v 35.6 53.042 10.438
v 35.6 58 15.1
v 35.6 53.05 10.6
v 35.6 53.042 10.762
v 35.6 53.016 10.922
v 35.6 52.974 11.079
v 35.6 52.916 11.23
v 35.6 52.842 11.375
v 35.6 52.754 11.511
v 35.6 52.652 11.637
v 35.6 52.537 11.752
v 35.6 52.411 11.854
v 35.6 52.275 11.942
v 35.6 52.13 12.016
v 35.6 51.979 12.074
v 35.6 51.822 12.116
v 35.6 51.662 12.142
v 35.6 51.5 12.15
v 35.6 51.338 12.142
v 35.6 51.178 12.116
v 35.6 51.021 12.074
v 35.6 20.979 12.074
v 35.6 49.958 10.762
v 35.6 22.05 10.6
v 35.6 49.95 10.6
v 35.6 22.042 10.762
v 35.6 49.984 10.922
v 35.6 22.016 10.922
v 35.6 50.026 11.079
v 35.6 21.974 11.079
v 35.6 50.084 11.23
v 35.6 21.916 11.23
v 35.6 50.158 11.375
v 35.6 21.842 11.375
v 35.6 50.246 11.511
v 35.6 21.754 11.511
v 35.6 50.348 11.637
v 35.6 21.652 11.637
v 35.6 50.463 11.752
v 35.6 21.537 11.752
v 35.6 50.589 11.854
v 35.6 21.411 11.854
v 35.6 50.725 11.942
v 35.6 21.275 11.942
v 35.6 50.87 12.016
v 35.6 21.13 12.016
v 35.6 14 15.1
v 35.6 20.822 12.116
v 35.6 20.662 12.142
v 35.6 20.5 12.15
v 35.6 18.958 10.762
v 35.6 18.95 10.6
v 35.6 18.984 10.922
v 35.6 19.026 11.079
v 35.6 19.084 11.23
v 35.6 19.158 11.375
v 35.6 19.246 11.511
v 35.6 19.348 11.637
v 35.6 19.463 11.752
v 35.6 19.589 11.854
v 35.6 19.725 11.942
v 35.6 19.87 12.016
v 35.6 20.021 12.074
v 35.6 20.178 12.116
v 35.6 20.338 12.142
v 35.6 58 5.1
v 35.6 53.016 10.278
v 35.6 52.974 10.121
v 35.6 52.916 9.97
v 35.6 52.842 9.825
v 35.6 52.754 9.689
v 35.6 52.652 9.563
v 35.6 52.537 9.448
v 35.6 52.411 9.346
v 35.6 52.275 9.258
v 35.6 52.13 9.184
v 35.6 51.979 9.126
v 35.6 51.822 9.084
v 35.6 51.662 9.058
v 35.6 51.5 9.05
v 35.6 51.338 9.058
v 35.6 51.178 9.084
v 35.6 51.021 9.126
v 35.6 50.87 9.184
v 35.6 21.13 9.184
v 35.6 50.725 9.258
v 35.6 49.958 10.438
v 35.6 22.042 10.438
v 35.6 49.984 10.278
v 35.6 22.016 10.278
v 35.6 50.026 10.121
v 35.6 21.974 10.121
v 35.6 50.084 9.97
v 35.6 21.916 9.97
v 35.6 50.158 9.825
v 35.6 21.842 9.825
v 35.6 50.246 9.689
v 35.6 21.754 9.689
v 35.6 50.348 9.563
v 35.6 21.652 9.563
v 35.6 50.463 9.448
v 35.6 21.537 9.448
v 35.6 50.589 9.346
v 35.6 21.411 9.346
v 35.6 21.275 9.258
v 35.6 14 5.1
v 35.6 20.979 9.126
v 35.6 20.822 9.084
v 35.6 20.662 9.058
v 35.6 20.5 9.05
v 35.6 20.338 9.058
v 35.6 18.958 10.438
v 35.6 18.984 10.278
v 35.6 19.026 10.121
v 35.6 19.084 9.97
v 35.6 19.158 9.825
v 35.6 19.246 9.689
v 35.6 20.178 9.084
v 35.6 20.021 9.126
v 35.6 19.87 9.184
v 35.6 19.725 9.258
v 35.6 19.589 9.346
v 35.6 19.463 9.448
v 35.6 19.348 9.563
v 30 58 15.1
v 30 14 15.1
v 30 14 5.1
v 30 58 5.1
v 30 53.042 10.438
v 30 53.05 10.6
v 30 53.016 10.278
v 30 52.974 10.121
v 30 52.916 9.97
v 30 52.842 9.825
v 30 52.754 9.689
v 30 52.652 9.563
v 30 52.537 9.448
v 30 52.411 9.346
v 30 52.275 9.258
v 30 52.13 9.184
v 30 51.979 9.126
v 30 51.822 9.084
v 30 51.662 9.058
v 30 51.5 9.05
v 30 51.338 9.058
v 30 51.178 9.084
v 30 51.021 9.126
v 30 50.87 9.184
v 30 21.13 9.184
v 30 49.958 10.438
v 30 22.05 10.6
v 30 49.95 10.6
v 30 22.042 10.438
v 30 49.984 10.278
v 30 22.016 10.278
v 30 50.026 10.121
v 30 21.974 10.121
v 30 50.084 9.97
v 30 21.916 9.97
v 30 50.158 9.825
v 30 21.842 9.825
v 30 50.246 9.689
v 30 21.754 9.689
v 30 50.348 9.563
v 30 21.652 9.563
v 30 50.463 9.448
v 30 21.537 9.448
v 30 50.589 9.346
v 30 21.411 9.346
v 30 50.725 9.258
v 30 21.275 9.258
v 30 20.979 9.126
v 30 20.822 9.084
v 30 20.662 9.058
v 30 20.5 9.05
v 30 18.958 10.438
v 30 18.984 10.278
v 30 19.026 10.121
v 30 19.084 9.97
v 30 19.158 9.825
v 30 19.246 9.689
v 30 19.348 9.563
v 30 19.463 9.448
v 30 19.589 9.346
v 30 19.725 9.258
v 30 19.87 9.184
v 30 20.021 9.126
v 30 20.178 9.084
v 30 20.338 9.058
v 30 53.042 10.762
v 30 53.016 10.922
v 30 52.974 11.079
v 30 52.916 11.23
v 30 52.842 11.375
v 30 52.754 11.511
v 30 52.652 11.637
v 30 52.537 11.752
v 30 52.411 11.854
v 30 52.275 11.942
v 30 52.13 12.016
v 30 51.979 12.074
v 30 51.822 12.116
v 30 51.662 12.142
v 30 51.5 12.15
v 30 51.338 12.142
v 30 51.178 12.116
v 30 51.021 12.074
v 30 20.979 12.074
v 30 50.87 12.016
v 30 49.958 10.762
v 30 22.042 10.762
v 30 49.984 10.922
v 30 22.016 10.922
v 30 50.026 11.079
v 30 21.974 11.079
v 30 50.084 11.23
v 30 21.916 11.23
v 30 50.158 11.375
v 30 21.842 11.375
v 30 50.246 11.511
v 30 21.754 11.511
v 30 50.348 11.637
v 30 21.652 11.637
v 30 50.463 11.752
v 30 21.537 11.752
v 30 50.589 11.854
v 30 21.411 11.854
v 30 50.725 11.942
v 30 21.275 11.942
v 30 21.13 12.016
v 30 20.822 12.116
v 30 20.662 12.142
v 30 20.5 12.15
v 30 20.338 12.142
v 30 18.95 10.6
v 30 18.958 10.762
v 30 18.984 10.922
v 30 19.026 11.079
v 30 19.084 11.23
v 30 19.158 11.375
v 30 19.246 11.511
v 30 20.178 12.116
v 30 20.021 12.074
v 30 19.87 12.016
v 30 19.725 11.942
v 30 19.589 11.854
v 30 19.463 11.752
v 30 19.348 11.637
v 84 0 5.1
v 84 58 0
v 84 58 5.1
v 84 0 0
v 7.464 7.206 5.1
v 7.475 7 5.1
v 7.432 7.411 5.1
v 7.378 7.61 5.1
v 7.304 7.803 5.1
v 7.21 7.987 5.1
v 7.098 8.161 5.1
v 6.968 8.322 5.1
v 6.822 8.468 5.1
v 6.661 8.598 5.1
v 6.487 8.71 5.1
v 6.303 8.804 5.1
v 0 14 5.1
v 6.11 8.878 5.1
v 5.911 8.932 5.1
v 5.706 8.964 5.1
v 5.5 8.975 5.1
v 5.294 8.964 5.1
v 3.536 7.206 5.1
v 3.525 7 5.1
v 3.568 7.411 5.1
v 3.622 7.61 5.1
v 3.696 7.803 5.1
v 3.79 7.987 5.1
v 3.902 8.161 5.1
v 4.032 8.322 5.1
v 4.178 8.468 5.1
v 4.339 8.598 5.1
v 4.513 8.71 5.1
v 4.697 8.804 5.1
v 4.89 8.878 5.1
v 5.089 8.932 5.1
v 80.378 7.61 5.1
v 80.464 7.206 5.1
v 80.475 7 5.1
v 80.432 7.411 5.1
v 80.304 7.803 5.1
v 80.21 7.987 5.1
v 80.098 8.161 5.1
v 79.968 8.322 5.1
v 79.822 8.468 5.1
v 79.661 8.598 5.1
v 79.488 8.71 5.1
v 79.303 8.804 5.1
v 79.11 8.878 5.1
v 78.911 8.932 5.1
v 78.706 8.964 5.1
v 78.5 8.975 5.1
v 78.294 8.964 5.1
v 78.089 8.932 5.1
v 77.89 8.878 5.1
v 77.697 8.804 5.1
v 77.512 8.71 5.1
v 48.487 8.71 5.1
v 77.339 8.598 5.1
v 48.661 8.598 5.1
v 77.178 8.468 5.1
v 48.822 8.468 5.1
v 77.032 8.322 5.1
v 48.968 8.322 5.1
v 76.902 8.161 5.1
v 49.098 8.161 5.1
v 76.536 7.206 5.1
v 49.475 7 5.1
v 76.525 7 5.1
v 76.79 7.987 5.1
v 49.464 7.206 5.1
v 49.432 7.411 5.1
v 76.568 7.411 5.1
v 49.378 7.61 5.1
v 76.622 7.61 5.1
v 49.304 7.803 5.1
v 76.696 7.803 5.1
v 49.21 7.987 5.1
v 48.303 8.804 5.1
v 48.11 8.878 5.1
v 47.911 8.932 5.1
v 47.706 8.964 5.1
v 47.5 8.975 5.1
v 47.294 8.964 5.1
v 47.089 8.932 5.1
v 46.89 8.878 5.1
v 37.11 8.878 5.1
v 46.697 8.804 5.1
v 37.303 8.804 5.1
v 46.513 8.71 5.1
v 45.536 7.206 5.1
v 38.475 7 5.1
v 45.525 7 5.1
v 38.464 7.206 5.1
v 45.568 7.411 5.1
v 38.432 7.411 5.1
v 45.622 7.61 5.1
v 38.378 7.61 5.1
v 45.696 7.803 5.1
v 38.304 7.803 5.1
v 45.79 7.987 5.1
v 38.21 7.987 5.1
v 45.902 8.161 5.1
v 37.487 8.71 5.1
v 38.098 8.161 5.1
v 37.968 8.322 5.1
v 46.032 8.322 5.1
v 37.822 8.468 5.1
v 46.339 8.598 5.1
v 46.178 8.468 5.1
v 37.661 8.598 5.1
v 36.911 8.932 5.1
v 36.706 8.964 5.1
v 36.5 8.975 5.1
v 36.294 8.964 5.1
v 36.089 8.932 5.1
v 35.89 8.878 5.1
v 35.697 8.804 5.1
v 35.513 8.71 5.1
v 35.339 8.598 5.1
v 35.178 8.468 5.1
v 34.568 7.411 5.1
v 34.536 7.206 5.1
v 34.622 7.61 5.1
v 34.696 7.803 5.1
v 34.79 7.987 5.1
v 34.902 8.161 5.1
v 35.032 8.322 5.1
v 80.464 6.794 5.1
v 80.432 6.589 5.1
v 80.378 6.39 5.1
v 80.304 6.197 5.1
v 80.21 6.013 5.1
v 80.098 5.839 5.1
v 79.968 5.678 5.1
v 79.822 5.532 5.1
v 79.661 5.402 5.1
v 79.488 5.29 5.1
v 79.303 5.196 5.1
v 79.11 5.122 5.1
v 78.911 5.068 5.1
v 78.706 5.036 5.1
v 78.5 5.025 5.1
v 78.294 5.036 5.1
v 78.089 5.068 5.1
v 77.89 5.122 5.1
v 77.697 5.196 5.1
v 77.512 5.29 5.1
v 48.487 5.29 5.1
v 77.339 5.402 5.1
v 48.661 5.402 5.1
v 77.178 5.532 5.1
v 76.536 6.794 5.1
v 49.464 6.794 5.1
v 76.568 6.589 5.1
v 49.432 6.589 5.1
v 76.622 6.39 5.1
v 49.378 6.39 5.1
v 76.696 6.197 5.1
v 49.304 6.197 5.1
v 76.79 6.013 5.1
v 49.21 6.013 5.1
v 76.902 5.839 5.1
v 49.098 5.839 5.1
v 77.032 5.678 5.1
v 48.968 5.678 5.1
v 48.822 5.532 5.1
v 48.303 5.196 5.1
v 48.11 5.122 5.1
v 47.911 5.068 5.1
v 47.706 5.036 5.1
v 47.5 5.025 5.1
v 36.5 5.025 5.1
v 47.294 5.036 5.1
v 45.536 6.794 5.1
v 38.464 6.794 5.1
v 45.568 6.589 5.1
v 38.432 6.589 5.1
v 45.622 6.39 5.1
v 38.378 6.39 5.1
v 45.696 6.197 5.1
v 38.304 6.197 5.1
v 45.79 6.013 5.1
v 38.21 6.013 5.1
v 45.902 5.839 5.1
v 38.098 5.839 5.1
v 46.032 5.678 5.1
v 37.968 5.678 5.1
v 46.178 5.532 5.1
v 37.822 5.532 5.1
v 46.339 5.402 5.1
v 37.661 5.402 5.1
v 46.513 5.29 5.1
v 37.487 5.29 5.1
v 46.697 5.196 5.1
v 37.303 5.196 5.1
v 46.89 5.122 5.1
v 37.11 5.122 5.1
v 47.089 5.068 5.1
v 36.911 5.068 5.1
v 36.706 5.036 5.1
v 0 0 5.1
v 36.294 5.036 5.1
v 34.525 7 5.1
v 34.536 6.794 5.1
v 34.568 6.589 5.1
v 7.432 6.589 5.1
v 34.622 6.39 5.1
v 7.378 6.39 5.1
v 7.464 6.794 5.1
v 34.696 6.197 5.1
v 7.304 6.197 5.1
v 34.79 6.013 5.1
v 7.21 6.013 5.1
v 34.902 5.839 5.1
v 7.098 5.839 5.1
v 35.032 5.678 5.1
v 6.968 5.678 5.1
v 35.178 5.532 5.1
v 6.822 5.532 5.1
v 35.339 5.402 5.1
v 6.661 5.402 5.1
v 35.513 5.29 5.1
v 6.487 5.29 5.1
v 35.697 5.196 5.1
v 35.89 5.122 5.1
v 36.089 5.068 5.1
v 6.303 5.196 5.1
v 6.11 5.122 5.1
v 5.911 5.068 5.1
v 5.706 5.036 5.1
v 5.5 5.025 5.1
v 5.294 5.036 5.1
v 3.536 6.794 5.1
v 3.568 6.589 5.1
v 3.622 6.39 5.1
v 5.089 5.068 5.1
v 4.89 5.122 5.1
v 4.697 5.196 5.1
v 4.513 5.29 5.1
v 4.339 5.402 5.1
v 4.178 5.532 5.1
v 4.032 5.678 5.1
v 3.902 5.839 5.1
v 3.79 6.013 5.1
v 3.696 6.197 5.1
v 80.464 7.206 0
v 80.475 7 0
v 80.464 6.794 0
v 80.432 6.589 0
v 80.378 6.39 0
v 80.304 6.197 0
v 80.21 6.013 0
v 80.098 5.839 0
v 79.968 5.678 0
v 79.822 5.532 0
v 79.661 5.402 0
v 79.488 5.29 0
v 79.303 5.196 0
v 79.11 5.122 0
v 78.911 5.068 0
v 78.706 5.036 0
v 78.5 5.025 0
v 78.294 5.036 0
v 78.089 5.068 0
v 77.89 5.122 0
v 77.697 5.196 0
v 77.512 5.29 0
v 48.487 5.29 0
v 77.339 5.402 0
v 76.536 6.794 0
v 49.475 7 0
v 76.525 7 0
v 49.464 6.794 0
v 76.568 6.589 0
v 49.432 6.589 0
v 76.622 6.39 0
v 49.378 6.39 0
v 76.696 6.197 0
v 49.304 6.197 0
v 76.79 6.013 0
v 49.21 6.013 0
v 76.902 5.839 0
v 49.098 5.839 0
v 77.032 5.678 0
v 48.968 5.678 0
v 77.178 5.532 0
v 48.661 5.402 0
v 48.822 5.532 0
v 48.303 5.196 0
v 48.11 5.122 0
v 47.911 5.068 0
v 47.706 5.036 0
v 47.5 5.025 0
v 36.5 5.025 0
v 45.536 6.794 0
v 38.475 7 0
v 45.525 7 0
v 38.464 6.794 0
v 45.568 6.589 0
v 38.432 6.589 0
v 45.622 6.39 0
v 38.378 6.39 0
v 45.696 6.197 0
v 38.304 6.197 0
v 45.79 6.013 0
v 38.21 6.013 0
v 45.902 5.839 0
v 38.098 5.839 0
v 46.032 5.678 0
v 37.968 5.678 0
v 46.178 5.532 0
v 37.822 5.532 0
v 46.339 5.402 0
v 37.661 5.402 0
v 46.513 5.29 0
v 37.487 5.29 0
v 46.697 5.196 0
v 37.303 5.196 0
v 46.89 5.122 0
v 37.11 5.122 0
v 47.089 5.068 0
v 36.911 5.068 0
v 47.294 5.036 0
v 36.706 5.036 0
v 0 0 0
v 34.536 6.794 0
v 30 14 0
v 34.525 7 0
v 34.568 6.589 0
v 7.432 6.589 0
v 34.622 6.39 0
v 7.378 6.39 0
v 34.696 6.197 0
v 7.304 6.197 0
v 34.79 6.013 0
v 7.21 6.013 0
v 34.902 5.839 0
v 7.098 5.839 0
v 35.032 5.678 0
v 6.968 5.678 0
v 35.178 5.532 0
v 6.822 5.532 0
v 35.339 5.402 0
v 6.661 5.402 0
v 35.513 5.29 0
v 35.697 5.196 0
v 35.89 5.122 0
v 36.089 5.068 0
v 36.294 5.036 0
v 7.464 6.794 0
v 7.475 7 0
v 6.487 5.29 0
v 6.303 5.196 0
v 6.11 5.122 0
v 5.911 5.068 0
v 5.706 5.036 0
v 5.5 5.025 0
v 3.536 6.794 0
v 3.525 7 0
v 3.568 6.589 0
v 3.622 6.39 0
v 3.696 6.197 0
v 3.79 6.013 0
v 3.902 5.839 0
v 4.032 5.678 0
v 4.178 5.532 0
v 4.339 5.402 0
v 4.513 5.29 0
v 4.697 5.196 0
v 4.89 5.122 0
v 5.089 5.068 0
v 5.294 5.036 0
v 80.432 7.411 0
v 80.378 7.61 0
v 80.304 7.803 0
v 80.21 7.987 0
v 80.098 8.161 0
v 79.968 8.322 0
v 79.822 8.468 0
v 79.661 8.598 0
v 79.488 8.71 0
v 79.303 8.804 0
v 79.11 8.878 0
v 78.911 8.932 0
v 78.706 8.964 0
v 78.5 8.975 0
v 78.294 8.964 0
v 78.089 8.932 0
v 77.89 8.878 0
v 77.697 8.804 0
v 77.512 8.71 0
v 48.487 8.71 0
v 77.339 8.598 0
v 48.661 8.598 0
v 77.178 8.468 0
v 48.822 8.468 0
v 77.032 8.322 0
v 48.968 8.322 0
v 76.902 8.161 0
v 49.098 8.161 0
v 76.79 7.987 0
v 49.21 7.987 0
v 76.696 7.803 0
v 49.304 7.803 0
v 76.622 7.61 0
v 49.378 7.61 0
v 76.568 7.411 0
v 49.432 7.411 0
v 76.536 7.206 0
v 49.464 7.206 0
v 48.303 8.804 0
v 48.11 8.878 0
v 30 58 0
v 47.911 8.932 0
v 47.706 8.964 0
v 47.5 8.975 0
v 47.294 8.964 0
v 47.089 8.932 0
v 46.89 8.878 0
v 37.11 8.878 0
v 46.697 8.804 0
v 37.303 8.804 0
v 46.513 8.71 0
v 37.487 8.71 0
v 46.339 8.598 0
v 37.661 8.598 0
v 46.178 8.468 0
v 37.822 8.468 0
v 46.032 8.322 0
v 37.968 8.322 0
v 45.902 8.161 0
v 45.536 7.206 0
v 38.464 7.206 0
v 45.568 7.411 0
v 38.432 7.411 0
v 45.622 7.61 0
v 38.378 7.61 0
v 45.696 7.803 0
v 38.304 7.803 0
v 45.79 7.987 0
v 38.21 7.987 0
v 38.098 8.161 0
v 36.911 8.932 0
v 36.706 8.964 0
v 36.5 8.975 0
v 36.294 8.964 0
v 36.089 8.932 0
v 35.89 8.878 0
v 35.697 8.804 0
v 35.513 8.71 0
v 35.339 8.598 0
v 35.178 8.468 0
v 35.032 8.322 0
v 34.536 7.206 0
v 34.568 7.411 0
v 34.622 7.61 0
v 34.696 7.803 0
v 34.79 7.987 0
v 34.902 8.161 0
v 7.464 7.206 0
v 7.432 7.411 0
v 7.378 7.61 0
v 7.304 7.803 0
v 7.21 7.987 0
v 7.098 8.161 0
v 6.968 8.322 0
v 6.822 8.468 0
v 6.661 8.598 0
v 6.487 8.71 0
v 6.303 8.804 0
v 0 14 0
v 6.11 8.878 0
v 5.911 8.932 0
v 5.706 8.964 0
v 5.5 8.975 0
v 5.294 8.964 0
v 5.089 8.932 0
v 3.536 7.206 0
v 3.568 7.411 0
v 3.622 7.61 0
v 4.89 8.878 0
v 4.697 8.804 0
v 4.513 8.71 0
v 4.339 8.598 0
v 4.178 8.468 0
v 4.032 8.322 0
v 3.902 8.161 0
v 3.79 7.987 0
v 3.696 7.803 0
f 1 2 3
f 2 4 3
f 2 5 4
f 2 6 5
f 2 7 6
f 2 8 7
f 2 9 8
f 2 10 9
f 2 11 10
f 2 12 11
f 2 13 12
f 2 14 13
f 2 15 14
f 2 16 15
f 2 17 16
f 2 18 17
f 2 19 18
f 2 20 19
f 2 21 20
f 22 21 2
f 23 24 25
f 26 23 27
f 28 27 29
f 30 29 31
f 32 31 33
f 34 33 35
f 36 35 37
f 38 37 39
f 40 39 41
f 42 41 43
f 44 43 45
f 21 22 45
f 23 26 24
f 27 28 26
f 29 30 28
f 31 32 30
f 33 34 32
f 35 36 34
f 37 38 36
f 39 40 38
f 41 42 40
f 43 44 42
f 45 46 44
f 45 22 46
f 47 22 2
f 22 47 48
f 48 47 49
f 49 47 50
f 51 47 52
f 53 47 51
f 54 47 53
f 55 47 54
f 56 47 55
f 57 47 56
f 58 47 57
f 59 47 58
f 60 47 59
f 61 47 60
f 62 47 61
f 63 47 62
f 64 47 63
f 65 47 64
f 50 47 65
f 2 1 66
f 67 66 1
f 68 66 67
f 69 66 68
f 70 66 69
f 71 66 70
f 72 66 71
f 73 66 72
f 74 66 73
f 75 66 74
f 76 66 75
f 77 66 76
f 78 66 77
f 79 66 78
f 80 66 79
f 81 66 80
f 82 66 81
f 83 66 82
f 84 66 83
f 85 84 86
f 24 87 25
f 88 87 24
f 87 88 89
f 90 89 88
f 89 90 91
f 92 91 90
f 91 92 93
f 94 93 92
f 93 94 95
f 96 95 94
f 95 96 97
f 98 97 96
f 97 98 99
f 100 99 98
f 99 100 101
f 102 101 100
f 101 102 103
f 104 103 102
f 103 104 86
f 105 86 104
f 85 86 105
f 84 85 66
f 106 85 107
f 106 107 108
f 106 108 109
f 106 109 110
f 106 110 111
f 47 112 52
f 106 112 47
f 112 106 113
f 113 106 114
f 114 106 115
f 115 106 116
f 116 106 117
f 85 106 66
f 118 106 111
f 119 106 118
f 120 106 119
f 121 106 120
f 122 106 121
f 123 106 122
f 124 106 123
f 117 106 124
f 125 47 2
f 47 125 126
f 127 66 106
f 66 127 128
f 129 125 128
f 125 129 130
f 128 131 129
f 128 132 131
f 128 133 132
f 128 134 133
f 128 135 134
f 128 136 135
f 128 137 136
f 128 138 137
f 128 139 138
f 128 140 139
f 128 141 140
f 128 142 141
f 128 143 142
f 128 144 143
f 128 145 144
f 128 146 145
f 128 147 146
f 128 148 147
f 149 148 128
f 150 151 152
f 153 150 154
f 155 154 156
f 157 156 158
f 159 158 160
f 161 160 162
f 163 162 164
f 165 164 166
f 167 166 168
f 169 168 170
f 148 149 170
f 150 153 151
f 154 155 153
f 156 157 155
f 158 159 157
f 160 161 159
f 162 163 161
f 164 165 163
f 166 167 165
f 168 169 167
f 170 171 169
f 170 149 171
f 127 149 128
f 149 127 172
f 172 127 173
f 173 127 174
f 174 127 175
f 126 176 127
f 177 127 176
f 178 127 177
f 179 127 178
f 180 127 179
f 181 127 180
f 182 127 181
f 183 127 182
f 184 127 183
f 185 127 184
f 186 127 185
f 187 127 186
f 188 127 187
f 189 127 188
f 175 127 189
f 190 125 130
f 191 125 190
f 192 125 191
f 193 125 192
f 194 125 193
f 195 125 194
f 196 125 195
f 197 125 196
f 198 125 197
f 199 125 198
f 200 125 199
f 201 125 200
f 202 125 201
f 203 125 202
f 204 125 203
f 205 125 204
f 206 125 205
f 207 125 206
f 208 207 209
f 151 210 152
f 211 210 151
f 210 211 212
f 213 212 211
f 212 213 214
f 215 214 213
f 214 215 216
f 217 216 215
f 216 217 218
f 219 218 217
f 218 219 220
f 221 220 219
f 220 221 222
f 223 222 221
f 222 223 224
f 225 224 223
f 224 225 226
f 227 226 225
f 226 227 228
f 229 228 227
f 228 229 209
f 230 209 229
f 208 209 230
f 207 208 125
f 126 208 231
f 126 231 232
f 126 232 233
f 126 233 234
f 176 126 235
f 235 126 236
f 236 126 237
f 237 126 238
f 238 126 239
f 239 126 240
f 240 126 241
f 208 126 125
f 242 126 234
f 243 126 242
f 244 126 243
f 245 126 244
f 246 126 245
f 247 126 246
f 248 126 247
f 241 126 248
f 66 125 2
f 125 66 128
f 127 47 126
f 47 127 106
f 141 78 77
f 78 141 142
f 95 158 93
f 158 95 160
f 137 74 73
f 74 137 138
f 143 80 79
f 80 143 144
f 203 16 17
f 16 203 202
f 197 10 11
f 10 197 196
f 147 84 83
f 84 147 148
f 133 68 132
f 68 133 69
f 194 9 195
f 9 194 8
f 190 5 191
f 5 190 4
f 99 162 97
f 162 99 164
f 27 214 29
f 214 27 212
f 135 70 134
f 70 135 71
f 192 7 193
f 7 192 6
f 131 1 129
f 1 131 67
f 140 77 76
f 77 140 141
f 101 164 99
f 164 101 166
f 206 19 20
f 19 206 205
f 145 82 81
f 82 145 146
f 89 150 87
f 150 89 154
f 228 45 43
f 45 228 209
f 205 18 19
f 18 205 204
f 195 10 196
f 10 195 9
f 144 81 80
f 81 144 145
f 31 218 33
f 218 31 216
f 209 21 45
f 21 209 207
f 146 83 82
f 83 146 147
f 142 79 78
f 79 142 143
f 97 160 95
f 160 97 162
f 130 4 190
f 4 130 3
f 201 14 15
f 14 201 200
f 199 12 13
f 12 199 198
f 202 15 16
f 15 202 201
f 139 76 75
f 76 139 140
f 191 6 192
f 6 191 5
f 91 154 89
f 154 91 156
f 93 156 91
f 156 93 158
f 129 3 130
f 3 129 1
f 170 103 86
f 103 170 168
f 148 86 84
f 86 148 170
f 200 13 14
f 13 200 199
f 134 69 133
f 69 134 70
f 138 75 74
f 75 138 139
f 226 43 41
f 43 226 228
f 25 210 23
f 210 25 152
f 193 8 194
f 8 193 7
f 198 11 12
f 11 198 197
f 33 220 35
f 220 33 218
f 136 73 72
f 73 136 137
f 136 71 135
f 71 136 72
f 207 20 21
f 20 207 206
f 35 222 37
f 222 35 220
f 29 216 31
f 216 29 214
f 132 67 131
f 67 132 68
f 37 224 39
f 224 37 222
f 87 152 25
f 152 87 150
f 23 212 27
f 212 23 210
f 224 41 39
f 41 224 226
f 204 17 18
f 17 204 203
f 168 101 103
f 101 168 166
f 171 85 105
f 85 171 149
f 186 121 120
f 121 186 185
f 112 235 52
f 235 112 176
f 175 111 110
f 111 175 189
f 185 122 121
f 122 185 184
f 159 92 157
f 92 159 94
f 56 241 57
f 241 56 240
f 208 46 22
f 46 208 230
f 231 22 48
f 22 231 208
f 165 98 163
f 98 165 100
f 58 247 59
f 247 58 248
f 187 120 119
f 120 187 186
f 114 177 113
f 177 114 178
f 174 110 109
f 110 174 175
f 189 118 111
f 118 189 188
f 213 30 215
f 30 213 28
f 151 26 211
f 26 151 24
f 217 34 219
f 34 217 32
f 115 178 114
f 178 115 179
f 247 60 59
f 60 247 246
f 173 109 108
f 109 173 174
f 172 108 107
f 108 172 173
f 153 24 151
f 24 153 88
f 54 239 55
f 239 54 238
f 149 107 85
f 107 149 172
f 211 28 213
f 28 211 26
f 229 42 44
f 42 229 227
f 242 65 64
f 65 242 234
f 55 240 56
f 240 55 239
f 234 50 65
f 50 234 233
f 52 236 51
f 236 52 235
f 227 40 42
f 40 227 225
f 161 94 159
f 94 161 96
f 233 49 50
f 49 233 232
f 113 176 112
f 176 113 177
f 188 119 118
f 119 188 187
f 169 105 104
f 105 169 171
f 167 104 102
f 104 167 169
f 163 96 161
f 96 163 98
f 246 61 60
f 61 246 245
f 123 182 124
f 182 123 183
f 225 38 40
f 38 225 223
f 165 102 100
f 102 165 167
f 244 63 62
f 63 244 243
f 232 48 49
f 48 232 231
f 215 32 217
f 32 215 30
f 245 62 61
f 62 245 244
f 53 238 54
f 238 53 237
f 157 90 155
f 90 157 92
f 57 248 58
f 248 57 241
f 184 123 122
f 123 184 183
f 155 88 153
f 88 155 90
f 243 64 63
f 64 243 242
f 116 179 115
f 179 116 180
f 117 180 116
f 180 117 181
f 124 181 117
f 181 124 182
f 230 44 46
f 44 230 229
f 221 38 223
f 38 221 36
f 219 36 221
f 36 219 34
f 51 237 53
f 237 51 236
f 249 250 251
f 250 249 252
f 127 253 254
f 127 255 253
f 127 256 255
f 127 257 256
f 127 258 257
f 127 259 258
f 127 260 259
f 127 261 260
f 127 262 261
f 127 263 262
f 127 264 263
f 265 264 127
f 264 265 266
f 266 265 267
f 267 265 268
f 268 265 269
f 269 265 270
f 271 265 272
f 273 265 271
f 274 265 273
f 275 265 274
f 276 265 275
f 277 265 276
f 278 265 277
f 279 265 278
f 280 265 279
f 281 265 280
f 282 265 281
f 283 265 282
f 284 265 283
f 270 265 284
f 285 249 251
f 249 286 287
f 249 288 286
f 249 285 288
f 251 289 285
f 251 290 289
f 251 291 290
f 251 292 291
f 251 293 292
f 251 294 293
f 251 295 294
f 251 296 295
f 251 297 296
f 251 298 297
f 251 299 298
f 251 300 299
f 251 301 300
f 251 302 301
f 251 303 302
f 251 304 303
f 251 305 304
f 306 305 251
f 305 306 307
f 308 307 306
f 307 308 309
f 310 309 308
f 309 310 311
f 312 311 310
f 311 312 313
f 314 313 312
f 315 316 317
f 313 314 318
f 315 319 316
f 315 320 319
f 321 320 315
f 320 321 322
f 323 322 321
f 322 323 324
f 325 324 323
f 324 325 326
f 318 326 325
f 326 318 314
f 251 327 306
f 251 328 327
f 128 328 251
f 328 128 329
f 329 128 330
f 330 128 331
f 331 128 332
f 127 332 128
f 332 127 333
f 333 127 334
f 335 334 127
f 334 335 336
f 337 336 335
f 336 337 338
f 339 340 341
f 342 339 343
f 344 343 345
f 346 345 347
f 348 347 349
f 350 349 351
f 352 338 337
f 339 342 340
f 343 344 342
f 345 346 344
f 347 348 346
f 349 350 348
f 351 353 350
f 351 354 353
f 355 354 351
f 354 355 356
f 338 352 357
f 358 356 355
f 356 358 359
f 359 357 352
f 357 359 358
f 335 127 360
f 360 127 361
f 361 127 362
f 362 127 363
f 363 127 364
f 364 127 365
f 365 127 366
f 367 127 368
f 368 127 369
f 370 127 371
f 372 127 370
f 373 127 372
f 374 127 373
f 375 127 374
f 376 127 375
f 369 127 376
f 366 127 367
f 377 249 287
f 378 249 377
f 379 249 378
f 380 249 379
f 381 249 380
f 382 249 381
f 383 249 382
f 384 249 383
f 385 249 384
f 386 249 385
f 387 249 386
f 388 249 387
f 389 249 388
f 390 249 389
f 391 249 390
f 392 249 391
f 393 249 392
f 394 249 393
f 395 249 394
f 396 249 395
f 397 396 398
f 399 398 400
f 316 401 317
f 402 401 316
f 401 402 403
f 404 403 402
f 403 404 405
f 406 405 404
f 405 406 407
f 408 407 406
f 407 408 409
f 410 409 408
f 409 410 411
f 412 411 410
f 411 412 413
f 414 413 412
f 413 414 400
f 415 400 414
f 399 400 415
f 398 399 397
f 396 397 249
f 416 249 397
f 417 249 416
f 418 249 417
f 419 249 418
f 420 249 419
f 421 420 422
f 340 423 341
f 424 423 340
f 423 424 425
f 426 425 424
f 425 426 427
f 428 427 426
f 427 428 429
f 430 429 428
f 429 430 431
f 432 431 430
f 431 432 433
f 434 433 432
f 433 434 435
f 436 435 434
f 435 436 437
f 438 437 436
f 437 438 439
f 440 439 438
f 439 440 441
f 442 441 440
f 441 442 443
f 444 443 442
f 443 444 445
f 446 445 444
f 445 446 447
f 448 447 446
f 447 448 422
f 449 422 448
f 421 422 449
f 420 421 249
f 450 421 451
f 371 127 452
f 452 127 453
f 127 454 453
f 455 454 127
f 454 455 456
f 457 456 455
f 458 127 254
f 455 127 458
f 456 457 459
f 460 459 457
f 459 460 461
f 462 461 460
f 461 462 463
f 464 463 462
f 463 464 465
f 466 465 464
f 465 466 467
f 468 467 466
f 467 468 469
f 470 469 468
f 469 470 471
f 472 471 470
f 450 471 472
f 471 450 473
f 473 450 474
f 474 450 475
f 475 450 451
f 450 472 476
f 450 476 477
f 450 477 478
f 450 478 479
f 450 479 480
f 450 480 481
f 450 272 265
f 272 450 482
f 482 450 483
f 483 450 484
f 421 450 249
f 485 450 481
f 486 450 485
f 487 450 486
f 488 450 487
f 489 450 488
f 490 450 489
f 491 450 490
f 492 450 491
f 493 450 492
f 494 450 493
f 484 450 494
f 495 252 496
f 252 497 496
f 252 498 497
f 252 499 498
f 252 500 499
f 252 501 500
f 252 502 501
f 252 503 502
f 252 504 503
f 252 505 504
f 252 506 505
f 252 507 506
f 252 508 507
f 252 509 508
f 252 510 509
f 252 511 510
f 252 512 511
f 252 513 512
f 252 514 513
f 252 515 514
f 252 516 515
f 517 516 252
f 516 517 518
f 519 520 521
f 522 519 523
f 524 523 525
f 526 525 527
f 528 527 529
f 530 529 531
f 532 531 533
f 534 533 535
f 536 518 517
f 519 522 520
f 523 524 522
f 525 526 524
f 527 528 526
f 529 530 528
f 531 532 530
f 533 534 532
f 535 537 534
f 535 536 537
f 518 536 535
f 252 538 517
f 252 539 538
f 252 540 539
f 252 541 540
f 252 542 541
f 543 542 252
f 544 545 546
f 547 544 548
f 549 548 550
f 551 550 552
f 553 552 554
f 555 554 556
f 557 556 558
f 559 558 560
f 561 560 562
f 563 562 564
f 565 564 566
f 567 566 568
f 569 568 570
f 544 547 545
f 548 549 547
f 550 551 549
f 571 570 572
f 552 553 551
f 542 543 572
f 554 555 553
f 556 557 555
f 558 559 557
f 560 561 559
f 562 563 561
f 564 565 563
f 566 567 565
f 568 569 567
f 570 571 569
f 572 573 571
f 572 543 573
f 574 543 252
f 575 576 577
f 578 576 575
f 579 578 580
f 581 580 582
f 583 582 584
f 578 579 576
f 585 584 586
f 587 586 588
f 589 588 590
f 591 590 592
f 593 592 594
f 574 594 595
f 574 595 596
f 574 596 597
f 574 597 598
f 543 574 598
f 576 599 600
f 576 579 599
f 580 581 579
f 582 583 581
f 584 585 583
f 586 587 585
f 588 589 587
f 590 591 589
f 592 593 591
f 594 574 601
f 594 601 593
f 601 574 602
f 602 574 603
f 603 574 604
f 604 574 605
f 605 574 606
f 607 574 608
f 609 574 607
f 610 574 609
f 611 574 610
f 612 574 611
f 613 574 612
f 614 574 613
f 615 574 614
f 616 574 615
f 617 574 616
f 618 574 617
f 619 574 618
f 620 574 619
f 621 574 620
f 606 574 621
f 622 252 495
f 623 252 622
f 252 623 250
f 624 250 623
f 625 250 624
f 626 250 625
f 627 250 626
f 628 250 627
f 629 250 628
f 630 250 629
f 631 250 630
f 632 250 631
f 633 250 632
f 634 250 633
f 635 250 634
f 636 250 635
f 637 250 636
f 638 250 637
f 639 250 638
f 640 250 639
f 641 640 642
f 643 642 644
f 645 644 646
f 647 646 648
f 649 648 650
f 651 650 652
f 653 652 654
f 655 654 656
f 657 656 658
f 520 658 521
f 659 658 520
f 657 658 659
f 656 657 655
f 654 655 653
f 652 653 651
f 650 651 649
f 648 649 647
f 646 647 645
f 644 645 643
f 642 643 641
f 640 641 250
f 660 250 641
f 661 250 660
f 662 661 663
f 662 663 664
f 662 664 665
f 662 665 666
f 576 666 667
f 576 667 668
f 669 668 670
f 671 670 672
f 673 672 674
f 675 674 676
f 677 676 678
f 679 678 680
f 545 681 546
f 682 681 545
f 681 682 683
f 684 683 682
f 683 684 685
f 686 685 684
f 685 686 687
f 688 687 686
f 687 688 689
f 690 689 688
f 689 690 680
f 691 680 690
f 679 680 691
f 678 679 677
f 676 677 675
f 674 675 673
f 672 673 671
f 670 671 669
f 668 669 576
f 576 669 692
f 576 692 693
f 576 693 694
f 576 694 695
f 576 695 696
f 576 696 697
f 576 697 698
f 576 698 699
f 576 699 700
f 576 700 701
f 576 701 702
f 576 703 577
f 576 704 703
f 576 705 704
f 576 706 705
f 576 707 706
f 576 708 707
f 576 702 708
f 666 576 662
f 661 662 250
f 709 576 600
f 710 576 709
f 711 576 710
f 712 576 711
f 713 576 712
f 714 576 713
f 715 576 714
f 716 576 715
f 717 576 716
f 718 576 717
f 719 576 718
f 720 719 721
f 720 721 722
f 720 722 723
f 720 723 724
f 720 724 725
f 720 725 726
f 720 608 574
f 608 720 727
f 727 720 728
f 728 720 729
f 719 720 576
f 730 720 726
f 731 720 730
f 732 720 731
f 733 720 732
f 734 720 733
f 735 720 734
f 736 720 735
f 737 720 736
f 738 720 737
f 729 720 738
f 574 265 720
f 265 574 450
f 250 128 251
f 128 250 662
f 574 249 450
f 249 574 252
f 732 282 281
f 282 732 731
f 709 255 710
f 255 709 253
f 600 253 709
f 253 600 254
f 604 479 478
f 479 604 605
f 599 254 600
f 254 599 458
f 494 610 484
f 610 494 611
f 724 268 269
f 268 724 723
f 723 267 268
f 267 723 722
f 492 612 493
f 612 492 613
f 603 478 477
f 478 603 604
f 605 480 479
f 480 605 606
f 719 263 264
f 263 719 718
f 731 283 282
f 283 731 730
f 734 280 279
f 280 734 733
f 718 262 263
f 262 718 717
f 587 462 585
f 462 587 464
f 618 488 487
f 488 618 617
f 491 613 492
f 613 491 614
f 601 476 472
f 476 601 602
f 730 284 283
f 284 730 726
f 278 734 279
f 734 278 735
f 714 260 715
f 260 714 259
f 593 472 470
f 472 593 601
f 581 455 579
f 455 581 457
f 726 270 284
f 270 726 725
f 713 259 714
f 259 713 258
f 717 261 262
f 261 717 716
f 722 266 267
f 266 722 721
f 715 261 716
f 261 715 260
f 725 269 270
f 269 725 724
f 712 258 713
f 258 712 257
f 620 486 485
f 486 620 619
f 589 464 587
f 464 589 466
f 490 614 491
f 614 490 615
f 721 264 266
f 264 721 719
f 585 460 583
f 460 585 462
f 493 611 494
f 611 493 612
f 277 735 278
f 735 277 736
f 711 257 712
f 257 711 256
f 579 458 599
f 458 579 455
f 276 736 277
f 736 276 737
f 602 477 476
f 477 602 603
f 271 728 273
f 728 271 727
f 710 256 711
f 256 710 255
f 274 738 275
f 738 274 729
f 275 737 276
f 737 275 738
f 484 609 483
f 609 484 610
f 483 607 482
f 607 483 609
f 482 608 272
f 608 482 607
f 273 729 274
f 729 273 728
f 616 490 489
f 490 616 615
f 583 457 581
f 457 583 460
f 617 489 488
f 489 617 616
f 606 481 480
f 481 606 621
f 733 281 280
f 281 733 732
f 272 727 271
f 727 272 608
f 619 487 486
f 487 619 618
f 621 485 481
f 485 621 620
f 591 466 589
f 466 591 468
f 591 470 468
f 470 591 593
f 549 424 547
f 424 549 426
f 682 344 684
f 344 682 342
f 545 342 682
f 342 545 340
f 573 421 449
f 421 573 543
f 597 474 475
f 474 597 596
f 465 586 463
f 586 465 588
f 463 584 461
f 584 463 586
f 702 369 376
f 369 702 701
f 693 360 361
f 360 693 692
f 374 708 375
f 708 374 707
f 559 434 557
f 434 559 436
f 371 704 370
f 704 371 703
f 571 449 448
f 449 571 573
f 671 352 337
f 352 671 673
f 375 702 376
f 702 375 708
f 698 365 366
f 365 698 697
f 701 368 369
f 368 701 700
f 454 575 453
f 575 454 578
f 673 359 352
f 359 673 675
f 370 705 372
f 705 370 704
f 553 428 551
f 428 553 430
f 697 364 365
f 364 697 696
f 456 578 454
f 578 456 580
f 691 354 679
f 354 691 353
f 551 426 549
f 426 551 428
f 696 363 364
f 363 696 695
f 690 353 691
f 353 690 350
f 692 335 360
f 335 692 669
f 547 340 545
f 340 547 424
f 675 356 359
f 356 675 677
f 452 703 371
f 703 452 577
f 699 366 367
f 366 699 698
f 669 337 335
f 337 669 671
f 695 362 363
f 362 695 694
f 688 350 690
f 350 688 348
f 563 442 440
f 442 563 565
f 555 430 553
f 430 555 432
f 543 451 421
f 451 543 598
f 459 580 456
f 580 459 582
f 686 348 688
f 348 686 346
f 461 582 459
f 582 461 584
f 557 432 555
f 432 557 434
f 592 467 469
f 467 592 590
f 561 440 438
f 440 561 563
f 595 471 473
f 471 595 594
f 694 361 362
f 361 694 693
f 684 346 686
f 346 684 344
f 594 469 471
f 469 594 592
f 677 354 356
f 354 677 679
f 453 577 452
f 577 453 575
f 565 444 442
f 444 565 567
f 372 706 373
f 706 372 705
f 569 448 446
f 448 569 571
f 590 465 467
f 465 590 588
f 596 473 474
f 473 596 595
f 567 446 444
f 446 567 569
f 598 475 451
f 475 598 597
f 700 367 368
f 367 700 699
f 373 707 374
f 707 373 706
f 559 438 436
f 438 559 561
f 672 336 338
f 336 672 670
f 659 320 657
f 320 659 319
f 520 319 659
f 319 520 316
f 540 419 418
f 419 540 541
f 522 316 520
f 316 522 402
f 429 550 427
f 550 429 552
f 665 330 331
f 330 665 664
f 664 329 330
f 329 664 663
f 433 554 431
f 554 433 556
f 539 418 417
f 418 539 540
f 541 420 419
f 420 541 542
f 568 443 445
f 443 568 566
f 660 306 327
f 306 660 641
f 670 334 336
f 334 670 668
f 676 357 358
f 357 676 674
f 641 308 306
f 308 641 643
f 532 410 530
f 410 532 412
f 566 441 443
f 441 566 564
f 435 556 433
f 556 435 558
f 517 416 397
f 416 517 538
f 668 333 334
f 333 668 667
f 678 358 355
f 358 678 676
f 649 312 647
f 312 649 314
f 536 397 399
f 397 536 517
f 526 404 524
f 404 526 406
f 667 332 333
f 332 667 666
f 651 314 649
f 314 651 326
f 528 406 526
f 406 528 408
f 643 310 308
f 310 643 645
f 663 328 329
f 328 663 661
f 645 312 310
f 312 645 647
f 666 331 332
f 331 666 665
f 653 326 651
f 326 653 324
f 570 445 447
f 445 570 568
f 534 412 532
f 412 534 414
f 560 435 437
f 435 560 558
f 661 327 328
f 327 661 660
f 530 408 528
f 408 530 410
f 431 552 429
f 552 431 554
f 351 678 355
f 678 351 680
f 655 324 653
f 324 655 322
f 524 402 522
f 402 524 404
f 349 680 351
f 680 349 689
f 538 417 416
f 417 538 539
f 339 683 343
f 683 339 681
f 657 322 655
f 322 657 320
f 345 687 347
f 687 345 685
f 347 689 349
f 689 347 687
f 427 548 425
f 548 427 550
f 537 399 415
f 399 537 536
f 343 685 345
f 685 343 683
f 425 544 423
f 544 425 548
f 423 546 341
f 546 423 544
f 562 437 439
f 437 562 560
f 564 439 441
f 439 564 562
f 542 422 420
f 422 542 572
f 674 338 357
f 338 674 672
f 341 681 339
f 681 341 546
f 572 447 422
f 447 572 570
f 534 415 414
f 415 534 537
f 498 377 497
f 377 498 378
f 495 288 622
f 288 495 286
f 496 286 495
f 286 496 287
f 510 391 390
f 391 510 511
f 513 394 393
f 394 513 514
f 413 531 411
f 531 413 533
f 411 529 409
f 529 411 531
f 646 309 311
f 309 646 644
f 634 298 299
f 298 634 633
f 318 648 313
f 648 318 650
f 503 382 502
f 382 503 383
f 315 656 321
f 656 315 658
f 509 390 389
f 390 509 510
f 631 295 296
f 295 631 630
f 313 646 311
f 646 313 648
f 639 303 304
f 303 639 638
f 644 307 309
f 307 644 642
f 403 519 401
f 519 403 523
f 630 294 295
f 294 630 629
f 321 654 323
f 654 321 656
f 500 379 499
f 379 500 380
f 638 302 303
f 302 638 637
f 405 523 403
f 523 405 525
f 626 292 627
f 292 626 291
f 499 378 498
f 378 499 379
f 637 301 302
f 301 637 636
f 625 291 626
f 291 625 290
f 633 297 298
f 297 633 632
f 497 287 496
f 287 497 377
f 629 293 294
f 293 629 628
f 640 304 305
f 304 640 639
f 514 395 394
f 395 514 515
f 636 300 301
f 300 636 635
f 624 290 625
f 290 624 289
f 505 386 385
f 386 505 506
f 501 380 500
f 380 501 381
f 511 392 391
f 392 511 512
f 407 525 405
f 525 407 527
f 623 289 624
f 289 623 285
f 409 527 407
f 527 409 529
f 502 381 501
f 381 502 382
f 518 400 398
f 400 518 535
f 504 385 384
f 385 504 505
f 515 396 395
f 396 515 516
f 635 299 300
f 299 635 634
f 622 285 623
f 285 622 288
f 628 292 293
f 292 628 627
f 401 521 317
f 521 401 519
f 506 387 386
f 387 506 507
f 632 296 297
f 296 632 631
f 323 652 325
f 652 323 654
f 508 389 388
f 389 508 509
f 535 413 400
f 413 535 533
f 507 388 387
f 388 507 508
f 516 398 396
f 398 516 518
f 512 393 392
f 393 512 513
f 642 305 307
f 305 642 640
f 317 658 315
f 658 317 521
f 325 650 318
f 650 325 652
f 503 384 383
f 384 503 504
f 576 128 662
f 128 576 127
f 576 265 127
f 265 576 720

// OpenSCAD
$fn=60;
plate_width = 58;
plate_length = 84;
thickness = 5.1;
support_hole_diameter = 3.95;
support_hole_dist = 31;
support_hole_edge_dist = 7;
support_width = 14; //used for cutout for stepper
stepper_hole_dist = 31;
stepper_hole_diameter = 3.1;
stepper_support_height = 10;
stepper_support_width = 5.6;
stepper_hole_height = 5.5;
stepper_edge_cut = 30;


module stepper_support(){
    difference(){
        cube([stepper_support_width, plate_width - support_width, stepper_support_height]);
        translate([0, (plate_width - support_width + stepper_hole_dist) / 2, stepper_hole_height])
        rotate([0, 90, 0])
        cylinder(d=stepper_hole_diameter,  h=stepper_support_width);
        translate([0, (plate_width - support_width - stepper_hole_dist) / 2, stepper_hole_height])
        rotate([0, 90, 0])
        cylinder(d=stepper_hole_diameter,  h=stepper_support_width);
    }
}

module support_holes(){
    translate([plate_length/4 - support_hole_dist/2, support_hole_edge_dist, 0]){
        cylinder(d=support_hole_diameter, h=thickness);
        translate([support_hole_dist, 0, 0])
        cylinder(d=support_hole_diameter, h=thickness);
    }
    translate([3*plate_length/4 - support_hole_dist/2, support_hole_edge_dist, 0]){
        cylinder(d=support_hole_diameter, h=thickness);
        translate([support_hole_dist, 0, 0])
        cylinder(d=support_hole_diameter, h=thickness);
    }
}

difference(){
    union(){
        cube([plate_length, plate_width, thickness]);
        translate([stepper_edge_cut, support_width, thickness])
        stepper_support();
    }
    support_holes();
    translate([0,  support_width, 0])
    cube([stepper_edge_cut, plate_width - support_width, thickness]);
}
